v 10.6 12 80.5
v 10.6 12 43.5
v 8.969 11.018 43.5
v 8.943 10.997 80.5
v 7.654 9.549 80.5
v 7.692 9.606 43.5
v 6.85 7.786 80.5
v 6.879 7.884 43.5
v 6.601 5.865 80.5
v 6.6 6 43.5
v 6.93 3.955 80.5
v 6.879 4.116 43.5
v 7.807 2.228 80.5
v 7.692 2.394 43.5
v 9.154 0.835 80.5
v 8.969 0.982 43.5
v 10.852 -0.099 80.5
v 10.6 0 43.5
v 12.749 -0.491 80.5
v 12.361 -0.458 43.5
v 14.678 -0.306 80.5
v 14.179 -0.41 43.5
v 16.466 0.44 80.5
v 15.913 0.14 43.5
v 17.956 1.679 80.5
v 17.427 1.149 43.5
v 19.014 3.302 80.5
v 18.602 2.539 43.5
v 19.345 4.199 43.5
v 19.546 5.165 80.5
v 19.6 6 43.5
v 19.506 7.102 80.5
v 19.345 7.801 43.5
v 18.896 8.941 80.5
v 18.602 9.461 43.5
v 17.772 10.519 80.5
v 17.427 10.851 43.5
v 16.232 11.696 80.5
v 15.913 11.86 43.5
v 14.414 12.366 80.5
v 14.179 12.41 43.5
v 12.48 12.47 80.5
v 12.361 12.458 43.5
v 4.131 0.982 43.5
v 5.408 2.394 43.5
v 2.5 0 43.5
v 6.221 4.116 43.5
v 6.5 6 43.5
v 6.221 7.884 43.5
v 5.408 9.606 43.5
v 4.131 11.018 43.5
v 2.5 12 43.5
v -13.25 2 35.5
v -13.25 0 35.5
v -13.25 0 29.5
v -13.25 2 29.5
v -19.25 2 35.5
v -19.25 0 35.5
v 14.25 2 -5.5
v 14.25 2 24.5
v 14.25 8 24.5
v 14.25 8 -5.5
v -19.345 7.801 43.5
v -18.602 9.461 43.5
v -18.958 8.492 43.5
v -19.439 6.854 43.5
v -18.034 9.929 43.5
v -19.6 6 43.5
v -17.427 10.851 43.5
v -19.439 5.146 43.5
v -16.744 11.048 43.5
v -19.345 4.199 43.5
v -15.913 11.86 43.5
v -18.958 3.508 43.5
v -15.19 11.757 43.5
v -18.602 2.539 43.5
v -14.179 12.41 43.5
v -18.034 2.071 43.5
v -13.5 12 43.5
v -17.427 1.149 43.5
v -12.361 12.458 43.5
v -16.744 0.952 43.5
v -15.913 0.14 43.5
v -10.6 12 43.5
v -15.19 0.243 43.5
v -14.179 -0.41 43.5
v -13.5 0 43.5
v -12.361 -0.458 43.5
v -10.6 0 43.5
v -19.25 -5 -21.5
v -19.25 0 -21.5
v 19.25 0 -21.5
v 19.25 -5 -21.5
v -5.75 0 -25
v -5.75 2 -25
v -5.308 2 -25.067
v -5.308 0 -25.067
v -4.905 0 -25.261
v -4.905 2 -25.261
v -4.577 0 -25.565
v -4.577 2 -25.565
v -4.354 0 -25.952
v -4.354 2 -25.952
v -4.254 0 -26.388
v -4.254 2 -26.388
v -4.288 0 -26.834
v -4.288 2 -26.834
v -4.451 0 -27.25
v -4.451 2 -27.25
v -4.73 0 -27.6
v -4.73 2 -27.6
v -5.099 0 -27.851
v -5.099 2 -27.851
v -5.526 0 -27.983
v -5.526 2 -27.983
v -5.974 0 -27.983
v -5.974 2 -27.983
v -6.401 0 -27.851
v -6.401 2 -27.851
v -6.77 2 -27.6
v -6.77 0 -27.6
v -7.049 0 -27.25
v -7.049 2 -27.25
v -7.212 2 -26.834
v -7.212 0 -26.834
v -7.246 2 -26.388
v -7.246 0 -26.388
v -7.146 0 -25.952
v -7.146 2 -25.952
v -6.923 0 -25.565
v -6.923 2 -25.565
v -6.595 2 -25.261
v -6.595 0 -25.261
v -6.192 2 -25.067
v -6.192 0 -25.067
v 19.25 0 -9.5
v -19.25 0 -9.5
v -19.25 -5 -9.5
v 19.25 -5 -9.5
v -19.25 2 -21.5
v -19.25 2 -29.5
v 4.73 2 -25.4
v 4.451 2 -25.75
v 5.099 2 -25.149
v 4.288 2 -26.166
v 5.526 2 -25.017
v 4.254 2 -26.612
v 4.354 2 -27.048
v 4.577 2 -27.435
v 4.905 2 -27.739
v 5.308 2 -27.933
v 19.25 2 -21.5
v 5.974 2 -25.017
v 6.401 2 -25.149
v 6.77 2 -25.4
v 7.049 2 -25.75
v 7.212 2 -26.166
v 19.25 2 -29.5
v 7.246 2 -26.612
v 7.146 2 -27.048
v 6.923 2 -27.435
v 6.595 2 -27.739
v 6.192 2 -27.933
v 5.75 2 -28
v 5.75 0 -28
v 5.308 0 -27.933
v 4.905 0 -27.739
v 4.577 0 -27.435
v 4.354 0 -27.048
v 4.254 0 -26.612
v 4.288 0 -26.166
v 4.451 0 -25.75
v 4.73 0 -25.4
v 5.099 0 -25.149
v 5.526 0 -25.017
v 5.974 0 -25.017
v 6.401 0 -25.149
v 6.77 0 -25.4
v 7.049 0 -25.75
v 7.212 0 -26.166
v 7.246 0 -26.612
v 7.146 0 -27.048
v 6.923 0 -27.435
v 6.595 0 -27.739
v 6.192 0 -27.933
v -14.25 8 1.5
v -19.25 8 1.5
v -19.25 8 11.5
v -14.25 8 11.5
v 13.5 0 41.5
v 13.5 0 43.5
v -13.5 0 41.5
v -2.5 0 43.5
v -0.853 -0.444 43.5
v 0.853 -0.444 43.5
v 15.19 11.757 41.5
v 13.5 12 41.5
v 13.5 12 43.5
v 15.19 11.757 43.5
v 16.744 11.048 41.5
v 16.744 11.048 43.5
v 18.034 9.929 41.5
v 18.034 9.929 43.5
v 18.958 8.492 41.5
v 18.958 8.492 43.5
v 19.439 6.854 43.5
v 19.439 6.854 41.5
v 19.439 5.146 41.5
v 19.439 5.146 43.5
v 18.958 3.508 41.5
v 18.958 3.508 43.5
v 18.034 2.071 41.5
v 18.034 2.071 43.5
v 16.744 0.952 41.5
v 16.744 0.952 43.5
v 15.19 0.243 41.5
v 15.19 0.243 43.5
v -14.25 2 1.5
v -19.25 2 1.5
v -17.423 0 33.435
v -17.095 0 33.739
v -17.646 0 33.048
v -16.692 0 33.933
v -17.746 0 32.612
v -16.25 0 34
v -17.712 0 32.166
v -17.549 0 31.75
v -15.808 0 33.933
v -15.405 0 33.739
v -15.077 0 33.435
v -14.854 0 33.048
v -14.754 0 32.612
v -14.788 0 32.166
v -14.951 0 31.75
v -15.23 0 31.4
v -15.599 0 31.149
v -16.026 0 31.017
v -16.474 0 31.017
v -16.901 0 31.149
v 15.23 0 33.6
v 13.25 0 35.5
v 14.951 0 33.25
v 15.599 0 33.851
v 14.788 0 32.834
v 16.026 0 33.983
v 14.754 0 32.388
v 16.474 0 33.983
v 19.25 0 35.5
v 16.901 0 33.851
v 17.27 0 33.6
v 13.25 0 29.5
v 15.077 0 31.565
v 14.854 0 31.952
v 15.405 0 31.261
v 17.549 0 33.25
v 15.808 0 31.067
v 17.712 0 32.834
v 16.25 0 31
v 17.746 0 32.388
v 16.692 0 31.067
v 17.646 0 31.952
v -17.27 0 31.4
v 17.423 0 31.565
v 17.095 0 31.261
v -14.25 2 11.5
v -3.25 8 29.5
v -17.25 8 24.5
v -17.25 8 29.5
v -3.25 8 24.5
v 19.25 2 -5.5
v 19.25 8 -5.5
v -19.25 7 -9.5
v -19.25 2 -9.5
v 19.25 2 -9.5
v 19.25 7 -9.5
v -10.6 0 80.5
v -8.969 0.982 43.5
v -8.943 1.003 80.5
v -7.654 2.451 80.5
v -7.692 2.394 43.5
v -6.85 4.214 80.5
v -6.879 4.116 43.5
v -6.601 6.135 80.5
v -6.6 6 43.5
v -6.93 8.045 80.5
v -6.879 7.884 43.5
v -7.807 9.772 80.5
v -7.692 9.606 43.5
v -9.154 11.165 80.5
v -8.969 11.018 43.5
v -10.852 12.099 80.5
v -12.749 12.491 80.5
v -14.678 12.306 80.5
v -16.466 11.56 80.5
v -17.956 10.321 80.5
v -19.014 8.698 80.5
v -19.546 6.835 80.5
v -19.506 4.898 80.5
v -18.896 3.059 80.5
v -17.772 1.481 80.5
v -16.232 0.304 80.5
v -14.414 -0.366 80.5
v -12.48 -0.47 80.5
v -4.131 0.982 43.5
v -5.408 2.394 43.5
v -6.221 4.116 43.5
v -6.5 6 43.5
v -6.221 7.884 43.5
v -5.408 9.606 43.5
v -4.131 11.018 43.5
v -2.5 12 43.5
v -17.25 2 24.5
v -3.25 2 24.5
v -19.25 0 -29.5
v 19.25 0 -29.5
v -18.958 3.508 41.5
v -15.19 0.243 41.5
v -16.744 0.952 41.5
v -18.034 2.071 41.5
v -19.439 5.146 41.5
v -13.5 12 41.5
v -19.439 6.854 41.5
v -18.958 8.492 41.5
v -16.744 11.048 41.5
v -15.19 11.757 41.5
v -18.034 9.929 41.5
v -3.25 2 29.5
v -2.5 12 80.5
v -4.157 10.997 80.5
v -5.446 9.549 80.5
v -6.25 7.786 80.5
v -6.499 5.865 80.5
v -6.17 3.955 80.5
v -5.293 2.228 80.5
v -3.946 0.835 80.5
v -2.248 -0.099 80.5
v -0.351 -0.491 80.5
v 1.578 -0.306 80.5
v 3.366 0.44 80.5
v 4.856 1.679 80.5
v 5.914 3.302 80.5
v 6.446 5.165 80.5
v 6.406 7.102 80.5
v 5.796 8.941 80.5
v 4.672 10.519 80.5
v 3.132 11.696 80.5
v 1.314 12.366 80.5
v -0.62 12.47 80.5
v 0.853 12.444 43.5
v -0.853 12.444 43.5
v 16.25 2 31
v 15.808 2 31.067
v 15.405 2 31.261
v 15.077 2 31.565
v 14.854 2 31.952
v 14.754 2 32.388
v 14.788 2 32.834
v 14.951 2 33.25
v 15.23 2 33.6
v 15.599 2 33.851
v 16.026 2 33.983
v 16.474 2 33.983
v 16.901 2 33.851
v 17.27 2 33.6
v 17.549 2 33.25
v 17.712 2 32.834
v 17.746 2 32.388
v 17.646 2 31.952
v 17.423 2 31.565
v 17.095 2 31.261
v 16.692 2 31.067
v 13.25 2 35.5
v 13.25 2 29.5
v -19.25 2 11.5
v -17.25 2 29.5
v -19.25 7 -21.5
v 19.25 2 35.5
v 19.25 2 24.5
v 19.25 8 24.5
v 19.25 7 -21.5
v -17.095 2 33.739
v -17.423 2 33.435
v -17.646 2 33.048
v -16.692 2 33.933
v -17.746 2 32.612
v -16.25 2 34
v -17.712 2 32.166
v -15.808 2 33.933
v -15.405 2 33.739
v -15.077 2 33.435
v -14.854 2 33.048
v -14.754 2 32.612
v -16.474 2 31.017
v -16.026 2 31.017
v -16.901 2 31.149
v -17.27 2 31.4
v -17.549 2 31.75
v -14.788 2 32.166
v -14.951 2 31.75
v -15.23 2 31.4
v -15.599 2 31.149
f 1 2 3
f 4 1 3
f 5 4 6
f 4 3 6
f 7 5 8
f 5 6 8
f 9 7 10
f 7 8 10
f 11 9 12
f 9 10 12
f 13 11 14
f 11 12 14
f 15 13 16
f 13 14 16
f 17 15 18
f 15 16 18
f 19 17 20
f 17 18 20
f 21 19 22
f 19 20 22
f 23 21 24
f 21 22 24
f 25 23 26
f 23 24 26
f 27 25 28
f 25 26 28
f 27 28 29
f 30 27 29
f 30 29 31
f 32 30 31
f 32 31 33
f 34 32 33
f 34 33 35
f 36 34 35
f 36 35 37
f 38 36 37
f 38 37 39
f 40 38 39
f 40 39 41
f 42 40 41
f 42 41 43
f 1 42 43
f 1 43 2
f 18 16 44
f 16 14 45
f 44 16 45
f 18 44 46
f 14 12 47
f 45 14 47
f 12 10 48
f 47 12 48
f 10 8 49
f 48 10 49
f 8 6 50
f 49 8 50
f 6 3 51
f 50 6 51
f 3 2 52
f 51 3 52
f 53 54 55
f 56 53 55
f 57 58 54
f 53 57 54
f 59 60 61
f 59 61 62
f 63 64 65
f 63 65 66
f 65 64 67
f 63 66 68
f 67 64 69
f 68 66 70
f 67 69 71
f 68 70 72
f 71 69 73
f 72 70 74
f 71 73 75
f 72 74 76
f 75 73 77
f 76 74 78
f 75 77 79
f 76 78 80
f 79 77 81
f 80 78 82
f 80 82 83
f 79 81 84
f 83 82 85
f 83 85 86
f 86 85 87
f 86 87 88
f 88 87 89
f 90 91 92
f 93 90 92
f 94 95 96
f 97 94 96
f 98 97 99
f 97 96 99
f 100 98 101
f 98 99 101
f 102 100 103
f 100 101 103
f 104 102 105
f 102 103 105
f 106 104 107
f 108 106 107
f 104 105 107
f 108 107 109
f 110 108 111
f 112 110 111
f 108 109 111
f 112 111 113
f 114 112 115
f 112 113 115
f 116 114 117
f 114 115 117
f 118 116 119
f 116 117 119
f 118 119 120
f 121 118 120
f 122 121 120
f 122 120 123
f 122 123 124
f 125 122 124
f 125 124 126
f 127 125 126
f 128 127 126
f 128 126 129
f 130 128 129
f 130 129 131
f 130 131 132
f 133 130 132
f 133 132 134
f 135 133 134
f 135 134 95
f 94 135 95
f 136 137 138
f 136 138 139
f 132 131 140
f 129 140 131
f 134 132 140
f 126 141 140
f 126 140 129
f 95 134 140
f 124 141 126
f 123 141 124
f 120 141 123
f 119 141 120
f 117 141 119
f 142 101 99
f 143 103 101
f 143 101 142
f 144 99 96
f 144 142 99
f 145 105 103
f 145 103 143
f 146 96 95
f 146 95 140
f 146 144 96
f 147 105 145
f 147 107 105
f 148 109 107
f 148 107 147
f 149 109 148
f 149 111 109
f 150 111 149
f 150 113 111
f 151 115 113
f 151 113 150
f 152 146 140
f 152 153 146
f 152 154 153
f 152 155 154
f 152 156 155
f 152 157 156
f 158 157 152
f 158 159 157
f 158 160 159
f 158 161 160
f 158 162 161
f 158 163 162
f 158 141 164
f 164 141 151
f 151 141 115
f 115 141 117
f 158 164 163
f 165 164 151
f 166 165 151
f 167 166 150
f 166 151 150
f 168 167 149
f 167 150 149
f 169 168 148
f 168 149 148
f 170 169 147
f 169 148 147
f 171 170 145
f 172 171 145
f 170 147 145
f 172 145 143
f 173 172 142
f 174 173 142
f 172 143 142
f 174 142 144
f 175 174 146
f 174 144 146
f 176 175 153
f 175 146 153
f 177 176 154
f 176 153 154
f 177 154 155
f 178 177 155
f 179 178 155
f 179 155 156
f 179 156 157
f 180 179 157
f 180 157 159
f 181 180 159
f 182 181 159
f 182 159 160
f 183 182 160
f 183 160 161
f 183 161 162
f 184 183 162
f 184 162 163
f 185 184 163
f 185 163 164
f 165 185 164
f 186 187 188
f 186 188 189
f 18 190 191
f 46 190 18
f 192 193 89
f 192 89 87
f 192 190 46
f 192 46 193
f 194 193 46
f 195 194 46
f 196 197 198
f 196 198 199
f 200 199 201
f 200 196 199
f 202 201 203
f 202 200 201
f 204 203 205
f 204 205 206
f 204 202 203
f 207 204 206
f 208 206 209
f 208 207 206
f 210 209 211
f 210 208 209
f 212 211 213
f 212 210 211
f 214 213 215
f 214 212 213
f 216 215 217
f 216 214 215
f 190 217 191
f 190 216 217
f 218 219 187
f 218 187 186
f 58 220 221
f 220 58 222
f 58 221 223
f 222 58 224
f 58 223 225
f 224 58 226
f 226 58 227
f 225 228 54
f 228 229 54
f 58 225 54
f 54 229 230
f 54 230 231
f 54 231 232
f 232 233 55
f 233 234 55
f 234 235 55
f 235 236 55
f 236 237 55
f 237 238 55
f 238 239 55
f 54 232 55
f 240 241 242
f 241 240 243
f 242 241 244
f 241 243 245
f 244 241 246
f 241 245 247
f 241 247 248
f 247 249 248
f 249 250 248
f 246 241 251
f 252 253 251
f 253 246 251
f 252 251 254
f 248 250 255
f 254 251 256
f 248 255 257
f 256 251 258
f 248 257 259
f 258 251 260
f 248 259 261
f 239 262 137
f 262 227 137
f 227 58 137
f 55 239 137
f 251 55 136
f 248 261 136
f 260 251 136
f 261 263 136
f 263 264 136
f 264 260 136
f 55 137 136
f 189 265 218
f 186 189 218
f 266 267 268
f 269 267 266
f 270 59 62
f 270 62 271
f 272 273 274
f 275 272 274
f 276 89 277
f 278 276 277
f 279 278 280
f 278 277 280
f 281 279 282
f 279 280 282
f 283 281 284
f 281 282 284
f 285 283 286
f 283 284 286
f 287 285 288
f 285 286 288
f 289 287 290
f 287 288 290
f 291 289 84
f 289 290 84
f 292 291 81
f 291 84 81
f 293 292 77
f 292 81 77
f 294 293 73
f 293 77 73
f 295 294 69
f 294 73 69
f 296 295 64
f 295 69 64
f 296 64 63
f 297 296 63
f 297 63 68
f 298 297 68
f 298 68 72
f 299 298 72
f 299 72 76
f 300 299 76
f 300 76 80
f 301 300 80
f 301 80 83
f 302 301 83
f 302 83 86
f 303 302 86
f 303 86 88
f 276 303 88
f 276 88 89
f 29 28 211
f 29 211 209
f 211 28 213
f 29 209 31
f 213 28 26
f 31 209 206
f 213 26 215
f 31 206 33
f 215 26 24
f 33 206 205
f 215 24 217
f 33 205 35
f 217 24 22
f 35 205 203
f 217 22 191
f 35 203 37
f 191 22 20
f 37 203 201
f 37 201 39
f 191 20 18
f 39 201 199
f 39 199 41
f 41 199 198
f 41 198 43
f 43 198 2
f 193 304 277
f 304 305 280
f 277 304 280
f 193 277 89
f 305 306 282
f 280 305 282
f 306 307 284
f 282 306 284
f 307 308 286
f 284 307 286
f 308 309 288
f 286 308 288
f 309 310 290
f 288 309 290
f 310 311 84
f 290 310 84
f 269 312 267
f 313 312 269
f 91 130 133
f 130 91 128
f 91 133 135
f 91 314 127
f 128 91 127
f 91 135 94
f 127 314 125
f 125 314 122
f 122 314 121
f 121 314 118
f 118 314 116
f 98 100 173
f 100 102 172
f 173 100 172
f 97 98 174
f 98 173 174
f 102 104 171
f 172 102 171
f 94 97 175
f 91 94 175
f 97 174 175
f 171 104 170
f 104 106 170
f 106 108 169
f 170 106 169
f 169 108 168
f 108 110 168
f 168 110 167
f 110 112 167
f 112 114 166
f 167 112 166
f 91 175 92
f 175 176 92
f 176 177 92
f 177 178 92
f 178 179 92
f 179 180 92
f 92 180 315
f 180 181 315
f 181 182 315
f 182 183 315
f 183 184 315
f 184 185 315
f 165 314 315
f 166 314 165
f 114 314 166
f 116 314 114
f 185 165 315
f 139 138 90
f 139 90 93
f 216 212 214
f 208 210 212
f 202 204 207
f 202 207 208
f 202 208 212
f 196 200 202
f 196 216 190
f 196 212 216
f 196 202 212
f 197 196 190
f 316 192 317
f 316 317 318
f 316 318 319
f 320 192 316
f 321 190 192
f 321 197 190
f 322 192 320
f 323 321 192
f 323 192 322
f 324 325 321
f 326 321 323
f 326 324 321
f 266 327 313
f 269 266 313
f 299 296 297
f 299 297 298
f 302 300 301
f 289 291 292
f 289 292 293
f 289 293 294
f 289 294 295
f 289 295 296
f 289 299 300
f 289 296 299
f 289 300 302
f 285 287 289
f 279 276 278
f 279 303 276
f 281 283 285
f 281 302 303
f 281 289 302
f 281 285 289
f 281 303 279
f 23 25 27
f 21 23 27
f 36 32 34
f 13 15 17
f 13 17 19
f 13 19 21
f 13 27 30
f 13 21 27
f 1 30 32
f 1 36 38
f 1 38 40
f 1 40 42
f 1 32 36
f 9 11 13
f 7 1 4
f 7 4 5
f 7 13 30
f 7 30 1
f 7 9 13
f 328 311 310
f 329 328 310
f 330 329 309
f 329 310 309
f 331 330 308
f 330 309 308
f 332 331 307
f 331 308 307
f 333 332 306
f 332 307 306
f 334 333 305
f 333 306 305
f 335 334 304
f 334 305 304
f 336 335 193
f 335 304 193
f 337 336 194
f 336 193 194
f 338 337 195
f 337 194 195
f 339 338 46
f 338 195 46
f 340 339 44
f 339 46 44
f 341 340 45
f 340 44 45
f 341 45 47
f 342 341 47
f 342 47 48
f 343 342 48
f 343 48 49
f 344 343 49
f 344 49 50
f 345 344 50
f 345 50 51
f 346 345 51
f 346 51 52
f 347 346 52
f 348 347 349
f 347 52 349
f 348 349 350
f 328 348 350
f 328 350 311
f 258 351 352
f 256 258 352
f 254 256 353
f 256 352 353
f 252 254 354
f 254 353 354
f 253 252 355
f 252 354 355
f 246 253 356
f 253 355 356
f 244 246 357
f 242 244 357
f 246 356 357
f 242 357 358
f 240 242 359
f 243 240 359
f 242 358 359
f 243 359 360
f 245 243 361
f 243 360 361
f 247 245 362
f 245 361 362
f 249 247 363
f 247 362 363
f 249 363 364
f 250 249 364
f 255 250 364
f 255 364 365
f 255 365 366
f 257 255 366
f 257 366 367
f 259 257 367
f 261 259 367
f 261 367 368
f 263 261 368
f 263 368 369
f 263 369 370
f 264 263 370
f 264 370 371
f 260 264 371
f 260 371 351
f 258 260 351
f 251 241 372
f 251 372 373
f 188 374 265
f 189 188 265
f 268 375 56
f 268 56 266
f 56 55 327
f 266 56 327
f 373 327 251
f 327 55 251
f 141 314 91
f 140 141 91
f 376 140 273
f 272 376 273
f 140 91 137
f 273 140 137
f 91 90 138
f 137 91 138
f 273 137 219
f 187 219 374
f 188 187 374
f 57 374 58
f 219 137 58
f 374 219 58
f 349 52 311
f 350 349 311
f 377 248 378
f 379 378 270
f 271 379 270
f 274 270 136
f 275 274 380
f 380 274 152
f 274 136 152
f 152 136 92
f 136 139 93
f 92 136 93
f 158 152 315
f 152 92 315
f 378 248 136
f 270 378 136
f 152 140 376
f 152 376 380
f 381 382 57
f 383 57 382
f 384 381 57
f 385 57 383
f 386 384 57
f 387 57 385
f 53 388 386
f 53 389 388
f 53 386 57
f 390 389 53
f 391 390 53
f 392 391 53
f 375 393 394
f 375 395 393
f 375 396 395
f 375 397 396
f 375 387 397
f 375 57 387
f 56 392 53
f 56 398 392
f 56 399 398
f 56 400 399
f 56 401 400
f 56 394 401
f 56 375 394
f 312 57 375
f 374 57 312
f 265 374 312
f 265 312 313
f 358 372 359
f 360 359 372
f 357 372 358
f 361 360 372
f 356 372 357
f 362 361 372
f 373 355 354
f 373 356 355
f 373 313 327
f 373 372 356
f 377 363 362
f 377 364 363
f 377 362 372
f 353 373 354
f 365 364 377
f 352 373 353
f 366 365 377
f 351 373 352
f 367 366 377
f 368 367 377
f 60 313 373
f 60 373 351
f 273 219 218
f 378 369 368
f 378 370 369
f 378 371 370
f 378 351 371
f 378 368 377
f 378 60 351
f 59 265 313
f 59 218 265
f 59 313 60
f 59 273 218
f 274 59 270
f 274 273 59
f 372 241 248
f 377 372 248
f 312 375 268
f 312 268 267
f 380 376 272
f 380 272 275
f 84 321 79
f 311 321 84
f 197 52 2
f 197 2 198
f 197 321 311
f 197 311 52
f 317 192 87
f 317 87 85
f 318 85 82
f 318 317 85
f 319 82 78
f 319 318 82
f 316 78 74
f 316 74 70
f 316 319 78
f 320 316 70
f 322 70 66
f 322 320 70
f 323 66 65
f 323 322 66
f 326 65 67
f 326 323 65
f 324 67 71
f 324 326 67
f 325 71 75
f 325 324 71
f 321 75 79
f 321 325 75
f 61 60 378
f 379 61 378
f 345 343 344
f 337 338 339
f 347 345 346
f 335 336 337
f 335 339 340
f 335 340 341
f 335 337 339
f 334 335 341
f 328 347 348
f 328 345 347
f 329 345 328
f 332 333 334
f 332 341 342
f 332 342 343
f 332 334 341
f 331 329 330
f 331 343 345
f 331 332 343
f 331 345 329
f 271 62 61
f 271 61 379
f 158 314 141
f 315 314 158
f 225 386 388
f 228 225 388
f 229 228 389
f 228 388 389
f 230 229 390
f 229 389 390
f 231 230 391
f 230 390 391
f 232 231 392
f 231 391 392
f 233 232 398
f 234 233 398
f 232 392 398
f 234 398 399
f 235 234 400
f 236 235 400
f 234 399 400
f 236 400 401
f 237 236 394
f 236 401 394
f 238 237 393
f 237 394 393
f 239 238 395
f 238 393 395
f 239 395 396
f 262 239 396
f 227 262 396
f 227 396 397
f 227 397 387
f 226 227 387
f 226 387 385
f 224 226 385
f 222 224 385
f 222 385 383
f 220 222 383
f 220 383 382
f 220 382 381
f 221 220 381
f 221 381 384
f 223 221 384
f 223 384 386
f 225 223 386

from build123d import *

# Parameters (mm, degrees)
SKETCH_1_W          = 38.5
SKETCH_1_H          = 59
SKETCH_1_W_2        = 6
SKETCH_1_H_2        = 6
EXTRUDE_1_DEPTH     = 2
SKETCH_2_R          = 1.5
CUT_EXTRUDE_1_DEPTH = 41.432814644
SKETCH_3_W          = 5
SKETCH_3_H          = 30
SKETCH_3_H_2        = 10
SKETCH_3_W_2        = 14
SKETCH_3_H_3        = 5
EXTRUDE_2_DEPTH     = 6
SKETCH_4_W          = 38.5
SKETCH_4_H          = 12
EXTRUDE_3_DEPTH     = 5
SKETCH_5_W          = 38.5
SKETCH_5_H          = 12
EXTRUDE_4_DEPTH     = 5
EXTRUDE_5_DEPTH     = 2
SKETCH_7_R          = 6.5
EXTRUDE_7_DEPTH     = 37


with BuildPart() as part:
    # 스케치1 → 보스-돌출1 (new body)
    with BuildSketch(Plane(origin=(0, 0, 0), x_dir=(1, 0, 0), z_dir=(0, 1, 0))):
        Rectangle(SKETCH_1_W, SKETCH_1_H)
        with Locations((-16.25, -32.5)):
            Rectangle(SKETCH_1_W_2, SKETCH_1_H_2)
        with Locations((16.25, -32.5)):
            Rectangle(SKETCH_1_W_2, SKETCH_1_H_2)
    extrude(amount=EXTRUDE_1_DEPTH)

    # 스케치2 → 컷-돌출1 (cut, through all)
    with BuildSketch(Plane(origin=(0, 2, 0), x_dir=(1, 0, 0), z_dir=(0, 1, 0))):
        with Locations(Location((-16.25, -32.5, 0), (0, 0, 270))):
            Circle(SKETCH_2_R)
        with Locations(Location((5.75, 26.5, 0), (0, 0, 90))):
            Circle(SKETCH_2_R)
        with Locations(Location((-5.75, 26.5, 0), (0, 0, 270))):
            Circle(SKETCH_2_R)
        with Locations(Location((16.25, -32.5, 0), (0, 0, 90))):
            Circle(SKETCH_2_R)
    extrude(amount=-CUT_EXTRUDE_1_DEPTH, mode=Mode.SUBTRACT)

    # 스케치3 → 보스-돌출2 (add)
    with BuildSketch(Plane(origin=(0, 2, 0), x_dir=(1, 0, 0), z_dir=(0, 1, 0))):
        with Locations((16.75, -9.5)):
            Rectangle(SKETCH_3_W, SKETCH_3_H)
        with Locations((-16.75, -6.5)):
            Rectangle(SKETCH_3_W, SKETCH_3_H_2)
        with Locations((-10.25, -27)):
            Rectangle(SKETCH_3_W_2, SKETCH_3_H_3)
    extrude(amount=EXTRUDE_2_DEPTH)

    # 스케치4 → 보스-돌출3 (add)
    with BuildSketch(Plane(origin=(0, 2, 0), x_dir=(1, 0, 0), z_dir=(0, 1, 0))):
        with Locations((0, 15.5)):
            Rectangle(SKETCH_4_W, SKETCH_4_H)
    extrude(amount=EXTRUDE_3_DEPTH)

    # 스케치5 → 보스-돌출4 (add)
    with BuildSketch(Plane.XZ):
        with Locations((0, -15.5)):
            Rectangle(SKETCH_5_W, SKETCH_5_H)
    extrude(amount=EXTRUDE_4_DEPTH)


with BuildPart() as body_2:
    # 스케치6 → 보스-돌출5 (new body)
    with BuildSketch(Plane.XY.offset(41.5)):
        with BuildLine():
            Line((-13.5, 12), (13.5, 12))
            ThreePointArc((13.5, 12), (19.5, 6), (13.5, 0))
            Line((13.5, 0), (-13.5, 0))
            ThreePointArc((-13.5, 0), (-19.5, 6), (-13.5, 12))
        make_face()
    extrude(amount=EXTRUDE_5_DEPTH)

    # 스케치7 → 보스-돌출7 (add)
    with BuildSketch(Plane.XY.offset(43.5)):
        with Locations(Location((-13.1, 6, 0), (0, 0, 292.619864948))):
            Circle(SKETCH_7_R)
        with Locations(Location((0, 6, 0), (0, 0, 112.619864948))):
            Circle(SKETCH_7_R)
        with Locations(Location((13.1, 6, 0), (0, 0, 112.619864948))):
            Circle(SKETCH_7_R)
    extrude(amount=EXTRUDE_7_DEPTH)


solid = Compound([part.part, body_2.part])
